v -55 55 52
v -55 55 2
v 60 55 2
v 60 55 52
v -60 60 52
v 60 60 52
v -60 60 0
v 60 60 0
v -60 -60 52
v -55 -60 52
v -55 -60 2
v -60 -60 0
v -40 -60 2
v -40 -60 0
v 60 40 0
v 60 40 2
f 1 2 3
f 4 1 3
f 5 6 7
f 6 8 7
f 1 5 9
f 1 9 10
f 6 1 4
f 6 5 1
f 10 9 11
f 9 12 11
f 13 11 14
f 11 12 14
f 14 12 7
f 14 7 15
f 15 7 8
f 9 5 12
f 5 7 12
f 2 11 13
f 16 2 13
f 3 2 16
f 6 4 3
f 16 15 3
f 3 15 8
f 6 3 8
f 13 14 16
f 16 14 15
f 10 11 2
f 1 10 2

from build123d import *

# Parameters (mm, degrees)
F1_DEPTH = 2
F3_DEPTH = 50


with BuildPart() as f1:
    # F0 (on Top) → F1 (new body)
    with BuildSketch(Plane.XY):
        Polygon((60, 60), (-60, 60), (-60, -60), (-40, -60), (60, 40), align=None)
    extrude(amount=F1_DEPTH)

    # F2 (on face) → F3 (join)
    with BuildSketch(Plane.XY.offset(2)):
        Polygon((60, 55), (60, 60), (-60, 60), (-60, 55), (-60, -60), (-55, -60), (-55, 55), align=None)
    extrude(amount=F3_DEPTH)


solid = f1.part
